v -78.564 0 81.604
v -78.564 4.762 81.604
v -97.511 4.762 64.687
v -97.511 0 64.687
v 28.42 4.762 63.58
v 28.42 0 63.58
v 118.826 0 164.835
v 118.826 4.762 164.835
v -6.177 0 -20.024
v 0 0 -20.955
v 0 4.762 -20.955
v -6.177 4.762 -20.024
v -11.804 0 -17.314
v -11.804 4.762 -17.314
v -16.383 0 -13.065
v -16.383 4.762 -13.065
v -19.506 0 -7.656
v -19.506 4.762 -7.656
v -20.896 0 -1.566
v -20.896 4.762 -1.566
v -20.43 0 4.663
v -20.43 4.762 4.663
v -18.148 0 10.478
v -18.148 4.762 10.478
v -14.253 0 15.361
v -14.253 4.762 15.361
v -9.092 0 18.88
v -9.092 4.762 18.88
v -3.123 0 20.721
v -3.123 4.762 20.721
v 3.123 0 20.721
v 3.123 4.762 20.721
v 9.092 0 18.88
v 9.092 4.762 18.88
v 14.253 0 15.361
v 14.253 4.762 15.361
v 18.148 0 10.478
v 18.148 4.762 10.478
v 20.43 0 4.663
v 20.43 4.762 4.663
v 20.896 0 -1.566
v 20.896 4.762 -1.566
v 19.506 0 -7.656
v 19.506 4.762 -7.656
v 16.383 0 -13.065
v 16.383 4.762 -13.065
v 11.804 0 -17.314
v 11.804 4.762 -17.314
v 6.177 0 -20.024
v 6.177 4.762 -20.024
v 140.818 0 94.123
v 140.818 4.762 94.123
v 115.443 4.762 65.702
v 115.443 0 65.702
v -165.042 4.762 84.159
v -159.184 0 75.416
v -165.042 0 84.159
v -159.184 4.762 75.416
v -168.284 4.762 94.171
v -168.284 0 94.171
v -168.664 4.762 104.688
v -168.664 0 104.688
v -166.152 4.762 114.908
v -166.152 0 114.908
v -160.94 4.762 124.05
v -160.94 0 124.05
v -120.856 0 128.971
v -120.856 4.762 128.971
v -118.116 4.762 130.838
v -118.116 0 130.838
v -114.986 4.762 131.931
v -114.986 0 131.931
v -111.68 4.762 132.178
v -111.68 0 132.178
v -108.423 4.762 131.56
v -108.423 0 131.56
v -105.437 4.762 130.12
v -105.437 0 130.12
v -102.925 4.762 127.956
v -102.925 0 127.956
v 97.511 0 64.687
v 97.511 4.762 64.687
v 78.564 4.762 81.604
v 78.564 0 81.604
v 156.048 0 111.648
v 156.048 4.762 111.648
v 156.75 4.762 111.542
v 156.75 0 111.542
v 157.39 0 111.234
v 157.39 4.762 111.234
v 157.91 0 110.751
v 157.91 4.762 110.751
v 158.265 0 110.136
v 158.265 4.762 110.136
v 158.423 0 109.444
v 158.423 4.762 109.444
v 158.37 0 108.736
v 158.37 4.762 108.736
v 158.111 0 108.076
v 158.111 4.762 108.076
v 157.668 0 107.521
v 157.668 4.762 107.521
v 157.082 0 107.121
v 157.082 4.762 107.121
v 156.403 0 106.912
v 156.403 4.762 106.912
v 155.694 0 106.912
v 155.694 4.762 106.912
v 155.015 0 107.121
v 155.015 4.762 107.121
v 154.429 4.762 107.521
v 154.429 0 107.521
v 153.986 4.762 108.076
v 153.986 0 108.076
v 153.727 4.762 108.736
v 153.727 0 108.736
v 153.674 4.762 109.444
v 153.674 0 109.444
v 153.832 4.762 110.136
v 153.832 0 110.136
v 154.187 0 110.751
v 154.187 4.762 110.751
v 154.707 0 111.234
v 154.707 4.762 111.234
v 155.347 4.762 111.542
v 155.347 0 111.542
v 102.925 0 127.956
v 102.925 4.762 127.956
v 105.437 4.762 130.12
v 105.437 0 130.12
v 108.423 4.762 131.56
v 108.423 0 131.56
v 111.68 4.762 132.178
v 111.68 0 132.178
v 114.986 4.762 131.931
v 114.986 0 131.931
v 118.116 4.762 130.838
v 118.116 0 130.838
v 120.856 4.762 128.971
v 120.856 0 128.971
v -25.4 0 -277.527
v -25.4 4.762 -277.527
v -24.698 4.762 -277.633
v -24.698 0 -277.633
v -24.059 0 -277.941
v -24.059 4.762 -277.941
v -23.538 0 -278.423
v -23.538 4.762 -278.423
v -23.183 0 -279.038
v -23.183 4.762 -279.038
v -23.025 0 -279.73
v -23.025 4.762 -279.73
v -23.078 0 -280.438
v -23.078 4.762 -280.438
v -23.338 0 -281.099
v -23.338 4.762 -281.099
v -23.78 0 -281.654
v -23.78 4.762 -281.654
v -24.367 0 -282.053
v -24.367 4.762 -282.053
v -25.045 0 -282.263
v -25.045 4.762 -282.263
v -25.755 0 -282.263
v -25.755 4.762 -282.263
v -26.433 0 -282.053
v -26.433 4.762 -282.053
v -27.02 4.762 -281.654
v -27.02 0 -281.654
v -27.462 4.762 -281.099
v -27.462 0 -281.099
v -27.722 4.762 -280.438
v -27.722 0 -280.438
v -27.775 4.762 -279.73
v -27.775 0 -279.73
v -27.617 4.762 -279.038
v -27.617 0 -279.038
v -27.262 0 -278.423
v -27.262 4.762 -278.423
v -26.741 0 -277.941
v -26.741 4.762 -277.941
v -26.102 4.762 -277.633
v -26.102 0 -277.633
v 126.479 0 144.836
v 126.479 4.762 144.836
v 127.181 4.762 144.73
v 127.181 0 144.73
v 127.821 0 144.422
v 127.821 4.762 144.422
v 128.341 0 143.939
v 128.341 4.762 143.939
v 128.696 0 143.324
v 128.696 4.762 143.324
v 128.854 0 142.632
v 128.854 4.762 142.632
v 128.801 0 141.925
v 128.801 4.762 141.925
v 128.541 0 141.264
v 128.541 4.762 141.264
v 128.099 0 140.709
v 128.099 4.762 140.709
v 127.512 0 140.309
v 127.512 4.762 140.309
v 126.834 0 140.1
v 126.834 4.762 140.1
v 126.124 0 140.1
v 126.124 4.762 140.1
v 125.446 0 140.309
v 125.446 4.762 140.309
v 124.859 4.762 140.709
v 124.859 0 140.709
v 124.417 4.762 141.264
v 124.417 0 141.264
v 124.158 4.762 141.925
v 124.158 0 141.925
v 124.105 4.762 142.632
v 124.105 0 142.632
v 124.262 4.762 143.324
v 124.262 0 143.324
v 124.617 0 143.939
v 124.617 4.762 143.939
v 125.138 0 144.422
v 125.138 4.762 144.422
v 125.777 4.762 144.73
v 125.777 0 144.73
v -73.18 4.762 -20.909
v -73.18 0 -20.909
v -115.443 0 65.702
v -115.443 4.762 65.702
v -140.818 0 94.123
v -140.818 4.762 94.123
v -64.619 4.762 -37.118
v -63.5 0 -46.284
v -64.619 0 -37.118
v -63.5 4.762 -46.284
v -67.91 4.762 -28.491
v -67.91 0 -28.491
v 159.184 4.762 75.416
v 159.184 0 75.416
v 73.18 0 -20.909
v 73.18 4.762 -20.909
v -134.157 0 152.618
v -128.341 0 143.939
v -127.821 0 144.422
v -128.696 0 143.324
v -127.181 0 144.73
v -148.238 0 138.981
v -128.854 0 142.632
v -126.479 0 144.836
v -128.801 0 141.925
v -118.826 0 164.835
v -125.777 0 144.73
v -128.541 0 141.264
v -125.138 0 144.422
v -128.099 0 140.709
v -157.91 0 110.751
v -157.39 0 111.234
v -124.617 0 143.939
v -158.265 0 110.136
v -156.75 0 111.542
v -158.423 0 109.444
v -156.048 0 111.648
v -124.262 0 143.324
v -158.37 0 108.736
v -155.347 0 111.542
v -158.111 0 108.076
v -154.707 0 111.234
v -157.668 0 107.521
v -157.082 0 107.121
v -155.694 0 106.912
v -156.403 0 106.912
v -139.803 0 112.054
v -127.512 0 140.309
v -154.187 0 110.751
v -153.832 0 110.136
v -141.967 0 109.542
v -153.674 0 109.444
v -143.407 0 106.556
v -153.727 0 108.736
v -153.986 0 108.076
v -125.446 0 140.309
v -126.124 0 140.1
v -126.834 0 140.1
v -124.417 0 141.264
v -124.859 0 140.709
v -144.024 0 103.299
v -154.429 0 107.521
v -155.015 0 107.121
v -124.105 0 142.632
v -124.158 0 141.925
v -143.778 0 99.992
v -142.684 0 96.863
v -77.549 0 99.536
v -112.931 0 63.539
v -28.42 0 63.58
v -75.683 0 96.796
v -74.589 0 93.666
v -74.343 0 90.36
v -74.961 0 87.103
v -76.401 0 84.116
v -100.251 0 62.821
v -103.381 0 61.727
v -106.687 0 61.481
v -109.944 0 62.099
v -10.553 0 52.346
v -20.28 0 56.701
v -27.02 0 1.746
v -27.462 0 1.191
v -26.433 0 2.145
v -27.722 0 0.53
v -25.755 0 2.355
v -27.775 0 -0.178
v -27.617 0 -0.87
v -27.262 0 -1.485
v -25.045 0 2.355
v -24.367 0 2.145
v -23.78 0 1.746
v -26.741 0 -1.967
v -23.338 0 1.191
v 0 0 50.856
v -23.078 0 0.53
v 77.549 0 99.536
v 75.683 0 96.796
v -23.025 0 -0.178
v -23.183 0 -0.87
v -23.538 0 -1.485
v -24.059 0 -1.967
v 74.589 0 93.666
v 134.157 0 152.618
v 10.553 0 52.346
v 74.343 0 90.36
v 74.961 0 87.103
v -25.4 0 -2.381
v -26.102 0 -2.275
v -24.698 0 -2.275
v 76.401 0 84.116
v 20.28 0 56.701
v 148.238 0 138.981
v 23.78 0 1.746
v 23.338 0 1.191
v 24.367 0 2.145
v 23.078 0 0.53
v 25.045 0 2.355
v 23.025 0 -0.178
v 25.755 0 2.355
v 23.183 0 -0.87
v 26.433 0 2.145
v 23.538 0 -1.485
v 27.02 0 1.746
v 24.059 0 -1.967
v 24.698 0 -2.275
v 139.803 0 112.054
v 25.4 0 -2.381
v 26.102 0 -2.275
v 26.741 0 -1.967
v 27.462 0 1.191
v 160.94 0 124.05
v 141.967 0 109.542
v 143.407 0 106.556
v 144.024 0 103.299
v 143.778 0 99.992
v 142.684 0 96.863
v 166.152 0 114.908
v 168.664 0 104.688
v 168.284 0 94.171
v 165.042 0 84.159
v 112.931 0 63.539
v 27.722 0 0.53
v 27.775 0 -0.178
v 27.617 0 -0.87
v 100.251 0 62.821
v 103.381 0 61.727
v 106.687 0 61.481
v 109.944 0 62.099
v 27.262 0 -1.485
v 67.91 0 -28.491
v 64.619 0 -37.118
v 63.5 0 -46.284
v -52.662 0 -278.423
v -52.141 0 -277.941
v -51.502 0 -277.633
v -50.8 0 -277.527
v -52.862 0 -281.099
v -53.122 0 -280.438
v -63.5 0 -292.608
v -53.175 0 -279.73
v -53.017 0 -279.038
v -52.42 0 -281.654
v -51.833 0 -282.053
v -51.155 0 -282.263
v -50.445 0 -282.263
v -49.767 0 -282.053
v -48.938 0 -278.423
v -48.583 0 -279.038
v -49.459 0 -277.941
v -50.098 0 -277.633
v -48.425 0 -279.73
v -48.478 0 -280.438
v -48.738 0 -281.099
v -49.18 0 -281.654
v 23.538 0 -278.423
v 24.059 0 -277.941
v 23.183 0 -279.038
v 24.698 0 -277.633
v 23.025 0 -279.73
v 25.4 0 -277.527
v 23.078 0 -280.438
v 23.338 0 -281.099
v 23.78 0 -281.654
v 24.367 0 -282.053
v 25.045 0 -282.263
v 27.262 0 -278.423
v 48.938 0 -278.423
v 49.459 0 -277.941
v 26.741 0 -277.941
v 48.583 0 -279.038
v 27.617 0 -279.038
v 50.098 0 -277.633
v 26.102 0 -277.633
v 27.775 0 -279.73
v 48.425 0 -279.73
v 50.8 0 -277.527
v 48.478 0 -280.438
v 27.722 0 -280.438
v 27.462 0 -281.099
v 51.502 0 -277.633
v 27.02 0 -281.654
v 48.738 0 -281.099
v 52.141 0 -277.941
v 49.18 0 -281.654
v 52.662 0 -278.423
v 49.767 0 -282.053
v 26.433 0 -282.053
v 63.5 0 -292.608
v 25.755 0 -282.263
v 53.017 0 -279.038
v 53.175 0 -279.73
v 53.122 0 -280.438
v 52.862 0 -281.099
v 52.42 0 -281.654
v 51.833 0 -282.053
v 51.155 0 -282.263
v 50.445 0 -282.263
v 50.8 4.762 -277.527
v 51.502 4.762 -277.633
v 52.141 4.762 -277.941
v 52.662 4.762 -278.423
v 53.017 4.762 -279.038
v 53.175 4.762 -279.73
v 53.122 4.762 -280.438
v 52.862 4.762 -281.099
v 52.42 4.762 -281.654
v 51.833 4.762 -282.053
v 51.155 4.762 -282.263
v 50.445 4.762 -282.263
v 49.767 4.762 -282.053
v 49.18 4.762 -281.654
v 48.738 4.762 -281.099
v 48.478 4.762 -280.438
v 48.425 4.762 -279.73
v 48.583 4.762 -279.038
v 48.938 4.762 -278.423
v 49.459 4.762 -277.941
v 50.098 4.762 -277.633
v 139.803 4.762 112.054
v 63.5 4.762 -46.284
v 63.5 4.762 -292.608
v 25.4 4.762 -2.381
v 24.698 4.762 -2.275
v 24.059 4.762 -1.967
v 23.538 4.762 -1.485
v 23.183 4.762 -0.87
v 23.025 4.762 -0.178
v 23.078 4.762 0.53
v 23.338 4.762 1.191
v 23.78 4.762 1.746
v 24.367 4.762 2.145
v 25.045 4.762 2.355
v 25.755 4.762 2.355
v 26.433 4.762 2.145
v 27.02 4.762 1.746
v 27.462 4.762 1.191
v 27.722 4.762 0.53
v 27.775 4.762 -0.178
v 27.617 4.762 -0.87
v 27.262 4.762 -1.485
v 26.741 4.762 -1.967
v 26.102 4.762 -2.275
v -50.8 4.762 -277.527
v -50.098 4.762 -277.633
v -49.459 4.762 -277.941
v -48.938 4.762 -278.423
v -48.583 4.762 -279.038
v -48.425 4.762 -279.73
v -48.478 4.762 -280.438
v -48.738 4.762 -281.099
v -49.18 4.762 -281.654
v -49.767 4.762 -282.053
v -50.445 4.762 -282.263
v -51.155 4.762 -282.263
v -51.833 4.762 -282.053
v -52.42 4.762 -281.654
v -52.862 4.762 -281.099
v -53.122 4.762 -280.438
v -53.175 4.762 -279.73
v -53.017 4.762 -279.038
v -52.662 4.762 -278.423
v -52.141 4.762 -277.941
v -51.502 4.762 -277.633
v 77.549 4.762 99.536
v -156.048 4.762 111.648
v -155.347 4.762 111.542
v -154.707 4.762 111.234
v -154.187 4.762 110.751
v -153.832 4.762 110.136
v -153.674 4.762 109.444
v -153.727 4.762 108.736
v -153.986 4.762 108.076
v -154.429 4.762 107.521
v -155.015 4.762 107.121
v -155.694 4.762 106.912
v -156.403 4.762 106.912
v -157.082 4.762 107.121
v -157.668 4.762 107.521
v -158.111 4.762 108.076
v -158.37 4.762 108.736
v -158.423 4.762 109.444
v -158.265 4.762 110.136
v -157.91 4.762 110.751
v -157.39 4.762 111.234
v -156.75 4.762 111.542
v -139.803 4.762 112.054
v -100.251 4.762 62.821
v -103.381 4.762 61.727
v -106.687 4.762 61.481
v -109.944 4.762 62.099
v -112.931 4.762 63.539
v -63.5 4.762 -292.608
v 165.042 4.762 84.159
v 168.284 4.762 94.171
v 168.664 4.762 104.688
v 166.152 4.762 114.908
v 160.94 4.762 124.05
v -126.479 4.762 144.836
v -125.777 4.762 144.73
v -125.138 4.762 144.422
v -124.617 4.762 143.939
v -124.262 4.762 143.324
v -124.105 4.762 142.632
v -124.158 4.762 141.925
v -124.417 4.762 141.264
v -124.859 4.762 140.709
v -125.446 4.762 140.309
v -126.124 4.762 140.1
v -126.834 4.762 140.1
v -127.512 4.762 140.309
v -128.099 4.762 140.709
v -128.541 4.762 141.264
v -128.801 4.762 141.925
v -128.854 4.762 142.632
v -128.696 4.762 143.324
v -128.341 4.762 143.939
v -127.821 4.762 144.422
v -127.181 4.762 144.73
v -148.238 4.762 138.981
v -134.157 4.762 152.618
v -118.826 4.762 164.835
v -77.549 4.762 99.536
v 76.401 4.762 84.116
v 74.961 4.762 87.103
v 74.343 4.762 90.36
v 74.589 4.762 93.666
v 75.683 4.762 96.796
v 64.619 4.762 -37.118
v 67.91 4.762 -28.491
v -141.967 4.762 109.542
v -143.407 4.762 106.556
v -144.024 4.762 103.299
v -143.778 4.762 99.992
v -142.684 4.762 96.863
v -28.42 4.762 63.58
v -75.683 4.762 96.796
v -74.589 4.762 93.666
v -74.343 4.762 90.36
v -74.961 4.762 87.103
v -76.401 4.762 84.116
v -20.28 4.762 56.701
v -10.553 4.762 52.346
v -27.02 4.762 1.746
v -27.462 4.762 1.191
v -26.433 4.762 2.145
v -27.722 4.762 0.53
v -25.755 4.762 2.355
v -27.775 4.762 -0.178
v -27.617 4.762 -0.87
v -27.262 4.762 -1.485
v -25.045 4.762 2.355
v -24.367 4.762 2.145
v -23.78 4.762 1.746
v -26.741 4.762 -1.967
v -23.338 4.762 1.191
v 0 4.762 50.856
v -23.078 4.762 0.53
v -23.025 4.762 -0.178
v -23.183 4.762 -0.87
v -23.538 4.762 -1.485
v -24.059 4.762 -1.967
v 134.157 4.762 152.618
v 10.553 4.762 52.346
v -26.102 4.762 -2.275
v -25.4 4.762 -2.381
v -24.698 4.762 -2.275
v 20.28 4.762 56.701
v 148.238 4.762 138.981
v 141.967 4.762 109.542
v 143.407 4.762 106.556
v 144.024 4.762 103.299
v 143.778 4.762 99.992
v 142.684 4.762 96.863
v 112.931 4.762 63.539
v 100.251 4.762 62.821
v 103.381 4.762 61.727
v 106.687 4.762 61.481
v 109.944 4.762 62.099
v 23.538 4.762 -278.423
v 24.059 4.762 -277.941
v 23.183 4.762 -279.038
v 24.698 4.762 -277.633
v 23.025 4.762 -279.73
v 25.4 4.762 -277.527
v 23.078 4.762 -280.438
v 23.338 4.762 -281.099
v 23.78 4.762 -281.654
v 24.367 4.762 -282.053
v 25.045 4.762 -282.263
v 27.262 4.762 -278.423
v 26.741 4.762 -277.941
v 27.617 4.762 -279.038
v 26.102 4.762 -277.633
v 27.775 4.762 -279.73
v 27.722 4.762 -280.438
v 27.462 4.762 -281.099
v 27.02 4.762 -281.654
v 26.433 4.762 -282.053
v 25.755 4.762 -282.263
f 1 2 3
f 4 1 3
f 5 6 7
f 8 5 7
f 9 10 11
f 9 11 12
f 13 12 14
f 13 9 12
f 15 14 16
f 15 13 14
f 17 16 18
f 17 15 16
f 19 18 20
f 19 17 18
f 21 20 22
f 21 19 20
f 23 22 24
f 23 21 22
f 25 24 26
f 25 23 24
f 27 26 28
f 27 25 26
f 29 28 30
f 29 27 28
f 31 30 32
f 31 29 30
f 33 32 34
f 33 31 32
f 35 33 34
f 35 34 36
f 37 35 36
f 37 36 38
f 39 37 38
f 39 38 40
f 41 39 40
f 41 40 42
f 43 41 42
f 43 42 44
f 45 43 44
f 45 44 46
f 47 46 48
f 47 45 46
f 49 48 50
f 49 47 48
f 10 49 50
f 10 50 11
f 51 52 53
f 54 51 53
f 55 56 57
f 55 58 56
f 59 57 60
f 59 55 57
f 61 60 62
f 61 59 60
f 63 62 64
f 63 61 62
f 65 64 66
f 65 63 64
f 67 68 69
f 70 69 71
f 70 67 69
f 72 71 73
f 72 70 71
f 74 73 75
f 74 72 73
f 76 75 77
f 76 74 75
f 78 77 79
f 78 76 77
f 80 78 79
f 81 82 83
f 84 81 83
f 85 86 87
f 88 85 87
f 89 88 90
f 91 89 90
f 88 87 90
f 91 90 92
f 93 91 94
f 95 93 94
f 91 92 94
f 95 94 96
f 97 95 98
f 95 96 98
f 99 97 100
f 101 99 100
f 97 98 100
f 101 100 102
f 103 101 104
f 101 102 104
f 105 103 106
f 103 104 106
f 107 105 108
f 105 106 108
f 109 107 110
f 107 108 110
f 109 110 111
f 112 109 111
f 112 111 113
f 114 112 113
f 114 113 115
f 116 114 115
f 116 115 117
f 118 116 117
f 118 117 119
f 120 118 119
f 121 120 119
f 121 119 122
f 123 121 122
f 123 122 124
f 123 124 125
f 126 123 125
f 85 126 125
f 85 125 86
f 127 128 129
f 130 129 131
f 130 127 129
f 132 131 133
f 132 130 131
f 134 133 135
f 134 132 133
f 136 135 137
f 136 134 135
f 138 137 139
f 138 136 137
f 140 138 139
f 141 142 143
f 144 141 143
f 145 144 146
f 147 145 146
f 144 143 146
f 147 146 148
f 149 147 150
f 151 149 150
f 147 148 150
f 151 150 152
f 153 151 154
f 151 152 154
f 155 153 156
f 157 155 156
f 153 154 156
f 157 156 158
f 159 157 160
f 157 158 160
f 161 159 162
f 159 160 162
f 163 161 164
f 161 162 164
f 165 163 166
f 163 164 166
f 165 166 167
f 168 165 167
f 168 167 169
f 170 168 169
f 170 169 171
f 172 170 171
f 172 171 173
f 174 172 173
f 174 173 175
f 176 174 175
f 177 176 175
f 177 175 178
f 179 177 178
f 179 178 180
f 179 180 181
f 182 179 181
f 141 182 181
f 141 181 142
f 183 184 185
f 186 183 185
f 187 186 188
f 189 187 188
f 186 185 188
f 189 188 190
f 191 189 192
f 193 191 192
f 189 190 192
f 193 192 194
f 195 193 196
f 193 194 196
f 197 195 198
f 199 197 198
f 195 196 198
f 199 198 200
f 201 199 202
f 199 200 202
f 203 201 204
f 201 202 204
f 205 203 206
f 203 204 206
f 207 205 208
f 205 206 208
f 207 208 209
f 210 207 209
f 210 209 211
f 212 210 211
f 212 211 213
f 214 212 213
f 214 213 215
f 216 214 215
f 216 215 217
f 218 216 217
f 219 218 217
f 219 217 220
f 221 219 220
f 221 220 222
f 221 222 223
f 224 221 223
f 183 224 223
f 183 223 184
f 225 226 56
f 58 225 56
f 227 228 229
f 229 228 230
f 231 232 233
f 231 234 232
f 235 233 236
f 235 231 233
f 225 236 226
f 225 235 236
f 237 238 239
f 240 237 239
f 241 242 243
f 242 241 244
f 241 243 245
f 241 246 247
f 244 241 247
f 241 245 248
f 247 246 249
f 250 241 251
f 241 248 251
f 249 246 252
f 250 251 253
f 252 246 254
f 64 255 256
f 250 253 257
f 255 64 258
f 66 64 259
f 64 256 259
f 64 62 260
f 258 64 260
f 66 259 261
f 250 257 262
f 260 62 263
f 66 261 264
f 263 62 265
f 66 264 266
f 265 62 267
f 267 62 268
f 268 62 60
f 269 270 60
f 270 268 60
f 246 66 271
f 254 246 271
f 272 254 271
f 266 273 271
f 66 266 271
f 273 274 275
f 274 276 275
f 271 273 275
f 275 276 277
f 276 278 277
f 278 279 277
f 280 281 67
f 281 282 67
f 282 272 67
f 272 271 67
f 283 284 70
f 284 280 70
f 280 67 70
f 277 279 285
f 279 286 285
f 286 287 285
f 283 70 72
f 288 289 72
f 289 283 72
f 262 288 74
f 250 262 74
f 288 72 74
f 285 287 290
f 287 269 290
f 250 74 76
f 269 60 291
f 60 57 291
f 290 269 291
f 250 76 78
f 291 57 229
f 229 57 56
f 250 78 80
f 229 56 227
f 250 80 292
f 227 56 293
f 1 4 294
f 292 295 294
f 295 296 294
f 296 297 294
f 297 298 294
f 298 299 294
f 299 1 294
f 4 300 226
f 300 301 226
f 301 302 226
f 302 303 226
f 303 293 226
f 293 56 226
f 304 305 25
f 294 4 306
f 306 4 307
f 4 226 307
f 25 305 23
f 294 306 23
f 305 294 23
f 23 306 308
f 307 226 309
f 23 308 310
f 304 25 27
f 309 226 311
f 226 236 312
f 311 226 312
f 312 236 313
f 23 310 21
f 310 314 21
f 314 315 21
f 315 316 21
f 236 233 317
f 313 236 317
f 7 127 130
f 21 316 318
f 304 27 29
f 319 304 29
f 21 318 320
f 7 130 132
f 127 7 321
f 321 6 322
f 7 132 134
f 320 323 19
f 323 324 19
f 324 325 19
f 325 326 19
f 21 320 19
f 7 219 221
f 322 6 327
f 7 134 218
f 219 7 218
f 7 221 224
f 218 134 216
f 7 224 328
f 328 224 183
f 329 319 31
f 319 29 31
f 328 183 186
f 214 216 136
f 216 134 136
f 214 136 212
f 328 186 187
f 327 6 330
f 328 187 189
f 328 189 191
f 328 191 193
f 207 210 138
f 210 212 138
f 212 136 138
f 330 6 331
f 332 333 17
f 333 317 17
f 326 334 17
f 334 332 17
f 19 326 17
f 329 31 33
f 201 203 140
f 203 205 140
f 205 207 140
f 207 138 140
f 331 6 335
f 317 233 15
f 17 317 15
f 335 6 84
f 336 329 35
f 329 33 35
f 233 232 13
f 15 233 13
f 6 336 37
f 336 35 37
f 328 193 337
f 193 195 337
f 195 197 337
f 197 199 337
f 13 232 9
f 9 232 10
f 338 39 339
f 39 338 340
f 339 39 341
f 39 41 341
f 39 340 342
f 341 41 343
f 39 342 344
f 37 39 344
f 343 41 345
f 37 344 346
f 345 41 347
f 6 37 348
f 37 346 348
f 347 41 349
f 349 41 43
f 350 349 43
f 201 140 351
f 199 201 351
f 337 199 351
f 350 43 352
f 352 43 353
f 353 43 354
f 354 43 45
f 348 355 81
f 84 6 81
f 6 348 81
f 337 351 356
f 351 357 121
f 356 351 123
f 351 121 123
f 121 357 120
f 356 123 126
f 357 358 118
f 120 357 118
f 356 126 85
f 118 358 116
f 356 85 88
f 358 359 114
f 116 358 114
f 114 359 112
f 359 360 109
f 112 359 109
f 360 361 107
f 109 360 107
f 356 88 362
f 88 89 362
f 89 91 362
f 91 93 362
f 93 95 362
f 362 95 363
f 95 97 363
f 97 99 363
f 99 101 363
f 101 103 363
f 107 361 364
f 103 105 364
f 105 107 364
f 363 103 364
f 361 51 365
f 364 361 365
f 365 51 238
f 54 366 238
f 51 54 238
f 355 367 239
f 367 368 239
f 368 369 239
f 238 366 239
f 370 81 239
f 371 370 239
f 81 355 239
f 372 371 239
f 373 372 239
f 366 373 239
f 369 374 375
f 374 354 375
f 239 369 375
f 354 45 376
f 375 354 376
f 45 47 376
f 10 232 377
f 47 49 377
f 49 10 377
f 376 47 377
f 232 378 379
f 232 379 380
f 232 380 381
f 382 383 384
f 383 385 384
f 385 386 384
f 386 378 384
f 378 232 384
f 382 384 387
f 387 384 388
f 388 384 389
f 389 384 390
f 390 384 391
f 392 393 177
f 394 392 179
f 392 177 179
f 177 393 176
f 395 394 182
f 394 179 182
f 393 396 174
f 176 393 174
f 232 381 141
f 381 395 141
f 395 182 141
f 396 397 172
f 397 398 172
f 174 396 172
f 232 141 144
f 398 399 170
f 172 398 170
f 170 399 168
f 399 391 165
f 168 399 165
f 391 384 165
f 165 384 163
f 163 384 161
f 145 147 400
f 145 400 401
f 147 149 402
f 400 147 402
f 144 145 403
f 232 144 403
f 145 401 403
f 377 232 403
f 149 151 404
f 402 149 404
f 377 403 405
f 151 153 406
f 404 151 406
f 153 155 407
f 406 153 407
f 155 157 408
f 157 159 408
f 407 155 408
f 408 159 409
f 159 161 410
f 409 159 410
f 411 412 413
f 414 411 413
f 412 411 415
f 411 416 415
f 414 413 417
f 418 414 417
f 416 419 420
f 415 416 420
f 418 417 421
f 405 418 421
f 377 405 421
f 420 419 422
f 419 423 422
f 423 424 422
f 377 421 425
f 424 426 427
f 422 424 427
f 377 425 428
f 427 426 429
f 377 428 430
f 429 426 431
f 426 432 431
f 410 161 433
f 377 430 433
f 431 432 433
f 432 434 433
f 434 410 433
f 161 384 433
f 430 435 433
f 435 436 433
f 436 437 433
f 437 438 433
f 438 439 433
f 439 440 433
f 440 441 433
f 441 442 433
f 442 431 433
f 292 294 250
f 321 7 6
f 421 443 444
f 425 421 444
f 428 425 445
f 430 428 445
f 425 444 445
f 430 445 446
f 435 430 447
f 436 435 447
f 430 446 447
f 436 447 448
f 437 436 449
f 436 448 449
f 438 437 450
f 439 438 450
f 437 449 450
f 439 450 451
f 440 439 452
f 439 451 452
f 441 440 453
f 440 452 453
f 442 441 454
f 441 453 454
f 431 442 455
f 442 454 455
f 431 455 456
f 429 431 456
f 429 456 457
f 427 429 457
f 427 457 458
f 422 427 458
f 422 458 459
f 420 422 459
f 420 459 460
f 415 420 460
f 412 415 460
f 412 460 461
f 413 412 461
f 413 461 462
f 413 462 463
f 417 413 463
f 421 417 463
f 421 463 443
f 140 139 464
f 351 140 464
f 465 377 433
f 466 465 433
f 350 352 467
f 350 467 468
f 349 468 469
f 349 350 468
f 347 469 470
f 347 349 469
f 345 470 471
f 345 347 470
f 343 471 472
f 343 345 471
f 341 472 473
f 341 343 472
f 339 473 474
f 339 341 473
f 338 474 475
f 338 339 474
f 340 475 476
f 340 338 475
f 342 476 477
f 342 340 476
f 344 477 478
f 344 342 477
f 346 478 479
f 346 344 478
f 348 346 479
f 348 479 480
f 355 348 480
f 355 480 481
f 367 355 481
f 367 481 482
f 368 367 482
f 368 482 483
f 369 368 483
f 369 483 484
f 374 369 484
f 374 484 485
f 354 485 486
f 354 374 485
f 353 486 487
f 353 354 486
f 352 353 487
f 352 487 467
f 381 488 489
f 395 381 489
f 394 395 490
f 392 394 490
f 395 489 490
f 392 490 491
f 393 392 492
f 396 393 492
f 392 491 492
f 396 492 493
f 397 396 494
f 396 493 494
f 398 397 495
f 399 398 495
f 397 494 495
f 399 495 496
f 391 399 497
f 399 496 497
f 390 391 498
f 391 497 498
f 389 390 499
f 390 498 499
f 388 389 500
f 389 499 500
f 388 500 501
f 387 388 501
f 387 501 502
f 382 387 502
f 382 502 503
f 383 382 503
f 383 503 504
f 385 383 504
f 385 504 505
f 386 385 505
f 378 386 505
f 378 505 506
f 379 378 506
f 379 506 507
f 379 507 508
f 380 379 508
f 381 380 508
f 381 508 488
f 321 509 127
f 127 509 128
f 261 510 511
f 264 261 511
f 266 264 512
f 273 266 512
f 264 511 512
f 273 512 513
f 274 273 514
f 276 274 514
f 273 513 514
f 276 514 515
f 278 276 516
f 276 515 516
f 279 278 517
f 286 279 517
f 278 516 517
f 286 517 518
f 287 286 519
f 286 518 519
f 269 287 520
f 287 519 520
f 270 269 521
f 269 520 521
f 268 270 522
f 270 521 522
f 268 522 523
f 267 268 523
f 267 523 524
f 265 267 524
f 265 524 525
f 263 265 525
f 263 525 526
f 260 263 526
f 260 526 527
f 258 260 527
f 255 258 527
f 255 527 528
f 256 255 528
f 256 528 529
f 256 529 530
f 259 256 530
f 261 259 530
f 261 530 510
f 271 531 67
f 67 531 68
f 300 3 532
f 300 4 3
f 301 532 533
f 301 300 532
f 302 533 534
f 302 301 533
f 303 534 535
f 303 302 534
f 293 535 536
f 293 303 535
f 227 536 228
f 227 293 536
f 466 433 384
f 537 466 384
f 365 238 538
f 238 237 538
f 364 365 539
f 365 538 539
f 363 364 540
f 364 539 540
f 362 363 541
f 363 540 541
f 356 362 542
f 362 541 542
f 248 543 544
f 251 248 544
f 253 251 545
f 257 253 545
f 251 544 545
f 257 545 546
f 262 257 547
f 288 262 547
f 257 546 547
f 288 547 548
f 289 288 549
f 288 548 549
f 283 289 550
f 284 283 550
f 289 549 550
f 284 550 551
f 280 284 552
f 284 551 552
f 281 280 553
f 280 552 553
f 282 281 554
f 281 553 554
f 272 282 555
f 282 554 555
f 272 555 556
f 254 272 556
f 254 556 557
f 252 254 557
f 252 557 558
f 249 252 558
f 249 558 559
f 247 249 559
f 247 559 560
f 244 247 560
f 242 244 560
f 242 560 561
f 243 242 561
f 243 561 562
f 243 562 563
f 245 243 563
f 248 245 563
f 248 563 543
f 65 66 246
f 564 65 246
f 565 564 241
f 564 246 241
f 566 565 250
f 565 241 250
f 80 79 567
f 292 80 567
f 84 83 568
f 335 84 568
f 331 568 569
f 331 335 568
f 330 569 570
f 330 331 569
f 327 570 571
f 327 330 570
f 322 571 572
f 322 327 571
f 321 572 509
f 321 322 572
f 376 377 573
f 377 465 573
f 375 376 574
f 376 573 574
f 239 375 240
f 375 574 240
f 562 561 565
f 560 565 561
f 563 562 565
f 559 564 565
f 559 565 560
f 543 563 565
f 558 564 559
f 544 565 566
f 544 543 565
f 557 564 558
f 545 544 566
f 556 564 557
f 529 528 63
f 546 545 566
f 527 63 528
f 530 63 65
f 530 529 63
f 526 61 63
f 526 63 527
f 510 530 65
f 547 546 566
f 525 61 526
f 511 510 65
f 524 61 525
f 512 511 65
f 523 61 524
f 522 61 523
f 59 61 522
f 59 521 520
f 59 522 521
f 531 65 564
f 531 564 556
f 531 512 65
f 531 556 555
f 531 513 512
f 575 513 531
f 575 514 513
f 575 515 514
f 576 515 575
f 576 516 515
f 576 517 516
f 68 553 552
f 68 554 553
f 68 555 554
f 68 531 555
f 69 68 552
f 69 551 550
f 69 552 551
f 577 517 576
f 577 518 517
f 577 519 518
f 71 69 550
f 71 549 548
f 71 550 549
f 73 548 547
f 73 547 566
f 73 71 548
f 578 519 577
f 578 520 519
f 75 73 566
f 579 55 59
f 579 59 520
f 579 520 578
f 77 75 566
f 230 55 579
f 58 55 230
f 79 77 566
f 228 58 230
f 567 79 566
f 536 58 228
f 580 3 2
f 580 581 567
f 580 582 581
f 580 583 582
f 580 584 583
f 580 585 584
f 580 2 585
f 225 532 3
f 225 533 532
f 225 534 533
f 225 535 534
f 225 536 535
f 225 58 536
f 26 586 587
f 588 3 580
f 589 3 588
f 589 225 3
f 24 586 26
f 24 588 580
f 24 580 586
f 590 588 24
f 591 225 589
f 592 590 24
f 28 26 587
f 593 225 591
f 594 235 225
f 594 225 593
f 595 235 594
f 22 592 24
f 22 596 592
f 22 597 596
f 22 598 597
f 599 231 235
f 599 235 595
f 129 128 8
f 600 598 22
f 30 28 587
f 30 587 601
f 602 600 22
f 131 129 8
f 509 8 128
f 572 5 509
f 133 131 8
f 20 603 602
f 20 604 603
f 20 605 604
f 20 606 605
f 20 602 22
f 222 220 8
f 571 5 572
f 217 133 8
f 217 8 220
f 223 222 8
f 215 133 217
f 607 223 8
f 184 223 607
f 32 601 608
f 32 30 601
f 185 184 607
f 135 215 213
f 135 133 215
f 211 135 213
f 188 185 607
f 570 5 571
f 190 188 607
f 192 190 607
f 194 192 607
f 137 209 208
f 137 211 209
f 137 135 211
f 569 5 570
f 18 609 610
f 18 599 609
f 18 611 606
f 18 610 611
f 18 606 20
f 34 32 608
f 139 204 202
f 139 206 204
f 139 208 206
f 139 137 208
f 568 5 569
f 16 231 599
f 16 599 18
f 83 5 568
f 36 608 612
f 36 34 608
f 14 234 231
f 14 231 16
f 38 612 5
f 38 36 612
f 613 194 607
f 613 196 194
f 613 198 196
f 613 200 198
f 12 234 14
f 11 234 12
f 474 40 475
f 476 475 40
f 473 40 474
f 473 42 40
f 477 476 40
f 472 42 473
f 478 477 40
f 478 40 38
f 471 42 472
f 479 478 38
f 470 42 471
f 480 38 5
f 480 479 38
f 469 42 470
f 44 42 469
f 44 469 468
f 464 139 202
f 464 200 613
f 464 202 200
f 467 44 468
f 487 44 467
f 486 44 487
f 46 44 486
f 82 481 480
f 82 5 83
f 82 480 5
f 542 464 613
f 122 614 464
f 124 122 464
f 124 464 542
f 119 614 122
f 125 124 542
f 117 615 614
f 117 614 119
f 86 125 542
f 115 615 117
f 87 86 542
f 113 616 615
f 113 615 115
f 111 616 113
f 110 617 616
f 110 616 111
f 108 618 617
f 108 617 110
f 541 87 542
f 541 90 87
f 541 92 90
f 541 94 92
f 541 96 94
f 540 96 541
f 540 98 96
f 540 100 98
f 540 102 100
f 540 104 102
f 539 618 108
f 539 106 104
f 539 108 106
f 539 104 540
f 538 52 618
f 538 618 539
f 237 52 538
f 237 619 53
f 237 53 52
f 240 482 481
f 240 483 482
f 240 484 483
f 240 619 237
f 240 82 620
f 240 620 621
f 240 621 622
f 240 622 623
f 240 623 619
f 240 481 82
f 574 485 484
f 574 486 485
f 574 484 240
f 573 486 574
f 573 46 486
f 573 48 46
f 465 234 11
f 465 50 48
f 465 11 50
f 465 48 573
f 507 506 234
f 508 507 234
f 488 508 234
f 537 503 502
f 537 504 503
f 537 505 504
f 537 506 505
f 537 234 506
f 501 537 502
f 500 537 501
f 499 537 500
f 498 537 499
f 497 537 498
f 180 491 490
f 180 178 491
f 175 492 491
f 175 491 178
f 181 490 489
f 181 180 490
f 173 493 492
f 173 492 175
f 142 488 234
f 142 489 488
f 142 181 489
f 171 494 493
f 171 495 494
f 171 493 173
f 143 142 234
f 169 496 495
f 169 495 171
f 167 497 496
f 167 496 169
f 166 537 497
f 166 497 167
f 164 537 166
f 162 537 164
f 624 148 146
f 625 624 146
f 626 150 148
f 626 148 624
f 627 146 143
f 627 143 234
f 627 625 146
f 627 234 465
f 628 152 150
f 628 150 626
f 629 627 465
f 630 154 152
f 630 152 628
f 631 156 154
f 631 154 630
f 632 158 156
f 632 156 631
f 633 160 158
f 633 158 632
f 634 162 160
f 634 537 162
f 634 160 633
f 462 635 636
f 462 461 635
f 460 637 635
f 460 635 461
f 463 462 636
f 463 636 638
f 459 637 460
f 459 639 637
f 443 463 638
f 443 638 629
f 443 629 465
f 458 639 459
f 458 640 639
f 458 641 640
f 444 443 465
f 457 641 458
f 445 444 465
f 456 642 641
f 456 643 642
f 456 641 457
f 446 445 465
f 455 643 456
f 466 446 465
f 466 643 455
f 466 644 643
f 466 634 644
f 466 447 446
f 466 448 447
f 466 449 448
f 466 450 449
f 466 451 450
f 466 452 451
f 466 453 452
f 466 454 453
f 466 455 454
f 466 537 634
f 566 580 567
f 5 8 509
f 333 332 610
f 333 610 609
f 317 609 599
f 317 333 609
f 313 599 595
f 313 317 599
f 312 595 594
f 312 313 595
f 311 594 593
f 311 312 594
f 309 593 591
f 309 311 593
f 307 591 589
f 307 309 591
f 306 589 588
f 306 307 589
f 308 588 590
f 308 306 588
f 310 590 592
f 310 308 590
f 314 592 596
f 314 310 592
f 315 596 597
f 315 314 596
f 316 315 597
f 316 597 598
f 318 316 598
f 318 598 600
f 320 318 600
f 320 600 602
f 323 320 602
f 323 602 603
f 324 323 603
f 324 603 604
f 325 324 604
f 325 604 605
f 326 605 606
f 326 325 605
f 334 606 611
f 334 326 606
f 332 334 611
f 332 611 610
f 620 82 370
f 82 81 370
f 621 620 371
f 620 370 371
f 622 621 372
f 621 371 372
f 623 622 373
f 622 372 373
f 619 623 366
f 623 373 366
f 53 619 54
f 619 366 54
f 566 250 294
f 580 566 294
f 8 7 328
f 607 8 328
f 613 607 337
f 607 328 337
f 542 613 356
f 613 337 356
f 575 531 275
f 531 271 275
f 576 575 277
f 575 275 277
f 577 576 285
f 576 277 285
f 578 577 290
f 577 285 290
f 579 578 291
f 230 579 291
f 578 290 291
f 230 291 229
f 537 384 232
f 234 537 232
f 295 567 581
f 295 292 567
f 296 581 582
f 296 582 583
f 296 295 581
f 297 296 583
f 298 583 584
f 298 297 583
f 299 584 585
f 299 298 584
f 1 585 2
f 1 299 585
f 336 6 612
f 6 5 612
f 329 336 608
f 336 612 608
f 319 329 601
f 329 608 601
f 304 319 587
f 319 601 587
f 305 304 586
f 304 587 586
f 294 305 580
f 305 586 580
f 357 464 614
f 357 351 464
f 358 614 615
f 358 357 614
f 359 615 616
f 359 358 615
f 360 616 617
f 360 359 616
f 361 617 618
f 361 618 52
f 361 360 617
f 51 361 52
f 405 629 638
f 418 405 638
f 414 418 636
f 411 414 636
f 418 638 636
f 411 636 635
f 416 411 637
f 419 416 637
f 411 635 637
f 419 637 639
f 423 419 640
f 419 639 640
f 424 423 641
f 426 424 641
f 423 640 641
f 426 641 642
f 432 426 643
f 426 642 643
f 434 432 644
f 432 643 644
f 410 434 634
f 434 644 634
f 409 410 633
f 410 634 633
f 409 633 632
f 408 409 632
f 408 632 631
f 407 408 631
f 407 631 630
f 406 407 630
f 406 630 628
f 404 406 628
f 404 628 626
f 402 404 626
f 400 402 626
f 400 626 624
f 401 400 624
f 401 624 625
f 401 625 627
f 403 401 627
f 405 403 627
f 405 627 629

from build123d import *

# Parameters (mm, degrees)
SKETCH1_R           = 2.38125
SKETCH1_R_2         = 20.955
BOSS_EXTRUDE1_DEPTH = 4.7625
SKETCH2_R           = 2.38125
CUT_EXTRUDE1_DEPTH  = 343.797654481
FILLET1_R           = 38.1
SKETCH4_R           = 2.38125
CUT_EXTRUDE3_DEPTH  = 343.797654481
FILLET2_R           = 38.1
CUT_EXTRUDE4_DEPTH  = 338.871506933
FILLET3_R           = 12.7


with BuildPart() as part:
    # Sketch1 → Boss-Extrude1 (new body)
    with BuildSketch(Plane(origin=(0, 0, 0), x_dir=(1, 0, 0), z_dir=(0, 1, 0))):
        with BuildLine():
            Line((63.5, 31.75), (63.5, 292.608))
            Line((63.5, 292.608), (-63.5, 292.608))
            Line((-63.5, 292.608), (-63.5, 31.75))
            Line((-63.5, 31.75), (-178.516410583, -97.067662754))
            ThreePointArc((-178.516410583, -97.067662754), (-152.483723292, -134.309173667), (-118.826410583, -164.834838999))
            Line((-118.826410583, -164.834838999), (0, -31.75))
            Line((0, -31.75), (118.826410583, -164.834838999))
            ThreePointArc((118.826410583, -164.834838999), (152.483723292, -134.309173667), (178.516410583, -97.067662754))
            Line((178.516410583, -97.067662754), (63.5, 31.75))
        make_face()
        with Locations(Location((-25.4, 0, 0), (0, 0, 90))):
            Circle(SKETCH1_R, mode=Mode.SUBTRACT)
        with Locations(Location((0, 0, 0), (0, 0, 90))):
            Circle(SKETCH1_R_2, mode=Mode.SUBTRACT)
        with Locations(Location((25.4, 0, 0), (0, 0, 90))):
            Circle(SKETCH1_R, mode=Mode.SUBTRACT)
    extrude(amount=BOSS_EXTRUDE1_DEPTH)

    # Sketch2 → Cut-Extrude1 (cut, through all)
    with BuildSketch(Plane(origin=(0, 4.7625, 0), x_dir=(1, 0, 0), z_dir=(0, 1, 0))):
        with Locations(Location((25.4, 279.908, 0), (0, 0, 270))):
            Circle(SKETCH2_R)
        with Locations(Location((50.8, 279.908, 0), (0, 0, 270))):
            Circle(SKETCH2_R)
        with Locations(Location((-50.8, 279.908, 0), (0, 0, 270))):
            Circle(SKETCH2_R)
        with Locations(Location((-25.4, 279.908, 0), (0, 0, 270))):
            Circle(SKETCH2_R)
    extrude(amount=-CUT_EXTRUDE1_DEPTH, mode=Mode.SUBTRACT)

    # Fillet1
    fillet1_edges = [part.edges().sort_by_distance(p)[0] for p in [
        (63.5, 2.38125, -31.75),
        (0, 2.38125, 31.75),
        (-63.5, 2.38125, -31.75),
    ]]
    fillet(fillet1_edges, radius=FILLET1_R)

    # Sketch4 → Cut-Extrude3 (cut, through all)
    with BuildSketch(Plane(origin=(0, 4.7625, 0), x_dir=(1, 0, 0), z_dir=(0, 1, 0))):
        with Locations(Location((-156.048464437, -109.266311125, 0), (0, 0, 270))):
            Circle(SKETCH4_R)
        with Locations(Location((-126.479111192, -142.454499515, 0), (0, 0, 270))):
            Circle(SKETCH4_R)
        with Locations(Location((126.479111192, -142.454499515, 0), (0, 0, 270))):
            Circle(SKETCH4_R)
        with Locations(Location((156.048464437, -109.266311125, 0), (0, 0, 270))):
            Circle(SKETCH4_R)
    extrude(amount=-CUT_EXTRUDE3_DEPTH, mode=Mode.SUBTRACT)

    # Fillet2
    fillet2_edges = [part.edges().sort_by_distance(p)[0] for p in [
        (178.516410583, 2.38125, 97.067662754),
        (-178.516410583, 2.38125, 97.067662754),
    ]]
    fillet(fillet2_edges, radius=FILLET2_R)

    # Sketch5 → Cut-Extrude4 (cut, through all)
    with BuildSketch(Plane(origin=(0, 4.7625, 0), x_dir=(1, 0, 0), z_dir=(0, 1, 0))):
        Polygon((-149.276482194, -103.59593683), (-111.382942554, -137.429642709), (-69.090810204, -90.062718159), (-106.984349844, -56.22901228), align=None)
        Polygon((106.984349844, -56.22901228), (69.090810204, -90.062718159), (111.382942554, -137.429642709), (149.276482194, -103.59593683), align=None)
    extrude(amount=-CUT_EXTRUDE4_DEPTH, mode=Mode.SUBTRACT)

    # Fillet3
    fillet3_edges = [part.edges().sort_by_distance(p)[0] for p in [
        (-149.276482194, 2.38125, 103.59593683),
        (-106.984349844, 2.38125, 56.22901228),
        (-69.090810204, 2.38125, 90.062718159),
        (-111.382942554, 2.38125, 137.429642709),
        (106.984349844, 2.38125, 56.22901228),
        (149.276482194, 2.38125, 103.59593683),
        (111.382942554, 2.38125, 137.429642709),
        (69.090810204, 2.38125, 90.062718159),
    ]]
    fillet(fillet3_edges, radius=FILLET3_R)


solid = part.part
